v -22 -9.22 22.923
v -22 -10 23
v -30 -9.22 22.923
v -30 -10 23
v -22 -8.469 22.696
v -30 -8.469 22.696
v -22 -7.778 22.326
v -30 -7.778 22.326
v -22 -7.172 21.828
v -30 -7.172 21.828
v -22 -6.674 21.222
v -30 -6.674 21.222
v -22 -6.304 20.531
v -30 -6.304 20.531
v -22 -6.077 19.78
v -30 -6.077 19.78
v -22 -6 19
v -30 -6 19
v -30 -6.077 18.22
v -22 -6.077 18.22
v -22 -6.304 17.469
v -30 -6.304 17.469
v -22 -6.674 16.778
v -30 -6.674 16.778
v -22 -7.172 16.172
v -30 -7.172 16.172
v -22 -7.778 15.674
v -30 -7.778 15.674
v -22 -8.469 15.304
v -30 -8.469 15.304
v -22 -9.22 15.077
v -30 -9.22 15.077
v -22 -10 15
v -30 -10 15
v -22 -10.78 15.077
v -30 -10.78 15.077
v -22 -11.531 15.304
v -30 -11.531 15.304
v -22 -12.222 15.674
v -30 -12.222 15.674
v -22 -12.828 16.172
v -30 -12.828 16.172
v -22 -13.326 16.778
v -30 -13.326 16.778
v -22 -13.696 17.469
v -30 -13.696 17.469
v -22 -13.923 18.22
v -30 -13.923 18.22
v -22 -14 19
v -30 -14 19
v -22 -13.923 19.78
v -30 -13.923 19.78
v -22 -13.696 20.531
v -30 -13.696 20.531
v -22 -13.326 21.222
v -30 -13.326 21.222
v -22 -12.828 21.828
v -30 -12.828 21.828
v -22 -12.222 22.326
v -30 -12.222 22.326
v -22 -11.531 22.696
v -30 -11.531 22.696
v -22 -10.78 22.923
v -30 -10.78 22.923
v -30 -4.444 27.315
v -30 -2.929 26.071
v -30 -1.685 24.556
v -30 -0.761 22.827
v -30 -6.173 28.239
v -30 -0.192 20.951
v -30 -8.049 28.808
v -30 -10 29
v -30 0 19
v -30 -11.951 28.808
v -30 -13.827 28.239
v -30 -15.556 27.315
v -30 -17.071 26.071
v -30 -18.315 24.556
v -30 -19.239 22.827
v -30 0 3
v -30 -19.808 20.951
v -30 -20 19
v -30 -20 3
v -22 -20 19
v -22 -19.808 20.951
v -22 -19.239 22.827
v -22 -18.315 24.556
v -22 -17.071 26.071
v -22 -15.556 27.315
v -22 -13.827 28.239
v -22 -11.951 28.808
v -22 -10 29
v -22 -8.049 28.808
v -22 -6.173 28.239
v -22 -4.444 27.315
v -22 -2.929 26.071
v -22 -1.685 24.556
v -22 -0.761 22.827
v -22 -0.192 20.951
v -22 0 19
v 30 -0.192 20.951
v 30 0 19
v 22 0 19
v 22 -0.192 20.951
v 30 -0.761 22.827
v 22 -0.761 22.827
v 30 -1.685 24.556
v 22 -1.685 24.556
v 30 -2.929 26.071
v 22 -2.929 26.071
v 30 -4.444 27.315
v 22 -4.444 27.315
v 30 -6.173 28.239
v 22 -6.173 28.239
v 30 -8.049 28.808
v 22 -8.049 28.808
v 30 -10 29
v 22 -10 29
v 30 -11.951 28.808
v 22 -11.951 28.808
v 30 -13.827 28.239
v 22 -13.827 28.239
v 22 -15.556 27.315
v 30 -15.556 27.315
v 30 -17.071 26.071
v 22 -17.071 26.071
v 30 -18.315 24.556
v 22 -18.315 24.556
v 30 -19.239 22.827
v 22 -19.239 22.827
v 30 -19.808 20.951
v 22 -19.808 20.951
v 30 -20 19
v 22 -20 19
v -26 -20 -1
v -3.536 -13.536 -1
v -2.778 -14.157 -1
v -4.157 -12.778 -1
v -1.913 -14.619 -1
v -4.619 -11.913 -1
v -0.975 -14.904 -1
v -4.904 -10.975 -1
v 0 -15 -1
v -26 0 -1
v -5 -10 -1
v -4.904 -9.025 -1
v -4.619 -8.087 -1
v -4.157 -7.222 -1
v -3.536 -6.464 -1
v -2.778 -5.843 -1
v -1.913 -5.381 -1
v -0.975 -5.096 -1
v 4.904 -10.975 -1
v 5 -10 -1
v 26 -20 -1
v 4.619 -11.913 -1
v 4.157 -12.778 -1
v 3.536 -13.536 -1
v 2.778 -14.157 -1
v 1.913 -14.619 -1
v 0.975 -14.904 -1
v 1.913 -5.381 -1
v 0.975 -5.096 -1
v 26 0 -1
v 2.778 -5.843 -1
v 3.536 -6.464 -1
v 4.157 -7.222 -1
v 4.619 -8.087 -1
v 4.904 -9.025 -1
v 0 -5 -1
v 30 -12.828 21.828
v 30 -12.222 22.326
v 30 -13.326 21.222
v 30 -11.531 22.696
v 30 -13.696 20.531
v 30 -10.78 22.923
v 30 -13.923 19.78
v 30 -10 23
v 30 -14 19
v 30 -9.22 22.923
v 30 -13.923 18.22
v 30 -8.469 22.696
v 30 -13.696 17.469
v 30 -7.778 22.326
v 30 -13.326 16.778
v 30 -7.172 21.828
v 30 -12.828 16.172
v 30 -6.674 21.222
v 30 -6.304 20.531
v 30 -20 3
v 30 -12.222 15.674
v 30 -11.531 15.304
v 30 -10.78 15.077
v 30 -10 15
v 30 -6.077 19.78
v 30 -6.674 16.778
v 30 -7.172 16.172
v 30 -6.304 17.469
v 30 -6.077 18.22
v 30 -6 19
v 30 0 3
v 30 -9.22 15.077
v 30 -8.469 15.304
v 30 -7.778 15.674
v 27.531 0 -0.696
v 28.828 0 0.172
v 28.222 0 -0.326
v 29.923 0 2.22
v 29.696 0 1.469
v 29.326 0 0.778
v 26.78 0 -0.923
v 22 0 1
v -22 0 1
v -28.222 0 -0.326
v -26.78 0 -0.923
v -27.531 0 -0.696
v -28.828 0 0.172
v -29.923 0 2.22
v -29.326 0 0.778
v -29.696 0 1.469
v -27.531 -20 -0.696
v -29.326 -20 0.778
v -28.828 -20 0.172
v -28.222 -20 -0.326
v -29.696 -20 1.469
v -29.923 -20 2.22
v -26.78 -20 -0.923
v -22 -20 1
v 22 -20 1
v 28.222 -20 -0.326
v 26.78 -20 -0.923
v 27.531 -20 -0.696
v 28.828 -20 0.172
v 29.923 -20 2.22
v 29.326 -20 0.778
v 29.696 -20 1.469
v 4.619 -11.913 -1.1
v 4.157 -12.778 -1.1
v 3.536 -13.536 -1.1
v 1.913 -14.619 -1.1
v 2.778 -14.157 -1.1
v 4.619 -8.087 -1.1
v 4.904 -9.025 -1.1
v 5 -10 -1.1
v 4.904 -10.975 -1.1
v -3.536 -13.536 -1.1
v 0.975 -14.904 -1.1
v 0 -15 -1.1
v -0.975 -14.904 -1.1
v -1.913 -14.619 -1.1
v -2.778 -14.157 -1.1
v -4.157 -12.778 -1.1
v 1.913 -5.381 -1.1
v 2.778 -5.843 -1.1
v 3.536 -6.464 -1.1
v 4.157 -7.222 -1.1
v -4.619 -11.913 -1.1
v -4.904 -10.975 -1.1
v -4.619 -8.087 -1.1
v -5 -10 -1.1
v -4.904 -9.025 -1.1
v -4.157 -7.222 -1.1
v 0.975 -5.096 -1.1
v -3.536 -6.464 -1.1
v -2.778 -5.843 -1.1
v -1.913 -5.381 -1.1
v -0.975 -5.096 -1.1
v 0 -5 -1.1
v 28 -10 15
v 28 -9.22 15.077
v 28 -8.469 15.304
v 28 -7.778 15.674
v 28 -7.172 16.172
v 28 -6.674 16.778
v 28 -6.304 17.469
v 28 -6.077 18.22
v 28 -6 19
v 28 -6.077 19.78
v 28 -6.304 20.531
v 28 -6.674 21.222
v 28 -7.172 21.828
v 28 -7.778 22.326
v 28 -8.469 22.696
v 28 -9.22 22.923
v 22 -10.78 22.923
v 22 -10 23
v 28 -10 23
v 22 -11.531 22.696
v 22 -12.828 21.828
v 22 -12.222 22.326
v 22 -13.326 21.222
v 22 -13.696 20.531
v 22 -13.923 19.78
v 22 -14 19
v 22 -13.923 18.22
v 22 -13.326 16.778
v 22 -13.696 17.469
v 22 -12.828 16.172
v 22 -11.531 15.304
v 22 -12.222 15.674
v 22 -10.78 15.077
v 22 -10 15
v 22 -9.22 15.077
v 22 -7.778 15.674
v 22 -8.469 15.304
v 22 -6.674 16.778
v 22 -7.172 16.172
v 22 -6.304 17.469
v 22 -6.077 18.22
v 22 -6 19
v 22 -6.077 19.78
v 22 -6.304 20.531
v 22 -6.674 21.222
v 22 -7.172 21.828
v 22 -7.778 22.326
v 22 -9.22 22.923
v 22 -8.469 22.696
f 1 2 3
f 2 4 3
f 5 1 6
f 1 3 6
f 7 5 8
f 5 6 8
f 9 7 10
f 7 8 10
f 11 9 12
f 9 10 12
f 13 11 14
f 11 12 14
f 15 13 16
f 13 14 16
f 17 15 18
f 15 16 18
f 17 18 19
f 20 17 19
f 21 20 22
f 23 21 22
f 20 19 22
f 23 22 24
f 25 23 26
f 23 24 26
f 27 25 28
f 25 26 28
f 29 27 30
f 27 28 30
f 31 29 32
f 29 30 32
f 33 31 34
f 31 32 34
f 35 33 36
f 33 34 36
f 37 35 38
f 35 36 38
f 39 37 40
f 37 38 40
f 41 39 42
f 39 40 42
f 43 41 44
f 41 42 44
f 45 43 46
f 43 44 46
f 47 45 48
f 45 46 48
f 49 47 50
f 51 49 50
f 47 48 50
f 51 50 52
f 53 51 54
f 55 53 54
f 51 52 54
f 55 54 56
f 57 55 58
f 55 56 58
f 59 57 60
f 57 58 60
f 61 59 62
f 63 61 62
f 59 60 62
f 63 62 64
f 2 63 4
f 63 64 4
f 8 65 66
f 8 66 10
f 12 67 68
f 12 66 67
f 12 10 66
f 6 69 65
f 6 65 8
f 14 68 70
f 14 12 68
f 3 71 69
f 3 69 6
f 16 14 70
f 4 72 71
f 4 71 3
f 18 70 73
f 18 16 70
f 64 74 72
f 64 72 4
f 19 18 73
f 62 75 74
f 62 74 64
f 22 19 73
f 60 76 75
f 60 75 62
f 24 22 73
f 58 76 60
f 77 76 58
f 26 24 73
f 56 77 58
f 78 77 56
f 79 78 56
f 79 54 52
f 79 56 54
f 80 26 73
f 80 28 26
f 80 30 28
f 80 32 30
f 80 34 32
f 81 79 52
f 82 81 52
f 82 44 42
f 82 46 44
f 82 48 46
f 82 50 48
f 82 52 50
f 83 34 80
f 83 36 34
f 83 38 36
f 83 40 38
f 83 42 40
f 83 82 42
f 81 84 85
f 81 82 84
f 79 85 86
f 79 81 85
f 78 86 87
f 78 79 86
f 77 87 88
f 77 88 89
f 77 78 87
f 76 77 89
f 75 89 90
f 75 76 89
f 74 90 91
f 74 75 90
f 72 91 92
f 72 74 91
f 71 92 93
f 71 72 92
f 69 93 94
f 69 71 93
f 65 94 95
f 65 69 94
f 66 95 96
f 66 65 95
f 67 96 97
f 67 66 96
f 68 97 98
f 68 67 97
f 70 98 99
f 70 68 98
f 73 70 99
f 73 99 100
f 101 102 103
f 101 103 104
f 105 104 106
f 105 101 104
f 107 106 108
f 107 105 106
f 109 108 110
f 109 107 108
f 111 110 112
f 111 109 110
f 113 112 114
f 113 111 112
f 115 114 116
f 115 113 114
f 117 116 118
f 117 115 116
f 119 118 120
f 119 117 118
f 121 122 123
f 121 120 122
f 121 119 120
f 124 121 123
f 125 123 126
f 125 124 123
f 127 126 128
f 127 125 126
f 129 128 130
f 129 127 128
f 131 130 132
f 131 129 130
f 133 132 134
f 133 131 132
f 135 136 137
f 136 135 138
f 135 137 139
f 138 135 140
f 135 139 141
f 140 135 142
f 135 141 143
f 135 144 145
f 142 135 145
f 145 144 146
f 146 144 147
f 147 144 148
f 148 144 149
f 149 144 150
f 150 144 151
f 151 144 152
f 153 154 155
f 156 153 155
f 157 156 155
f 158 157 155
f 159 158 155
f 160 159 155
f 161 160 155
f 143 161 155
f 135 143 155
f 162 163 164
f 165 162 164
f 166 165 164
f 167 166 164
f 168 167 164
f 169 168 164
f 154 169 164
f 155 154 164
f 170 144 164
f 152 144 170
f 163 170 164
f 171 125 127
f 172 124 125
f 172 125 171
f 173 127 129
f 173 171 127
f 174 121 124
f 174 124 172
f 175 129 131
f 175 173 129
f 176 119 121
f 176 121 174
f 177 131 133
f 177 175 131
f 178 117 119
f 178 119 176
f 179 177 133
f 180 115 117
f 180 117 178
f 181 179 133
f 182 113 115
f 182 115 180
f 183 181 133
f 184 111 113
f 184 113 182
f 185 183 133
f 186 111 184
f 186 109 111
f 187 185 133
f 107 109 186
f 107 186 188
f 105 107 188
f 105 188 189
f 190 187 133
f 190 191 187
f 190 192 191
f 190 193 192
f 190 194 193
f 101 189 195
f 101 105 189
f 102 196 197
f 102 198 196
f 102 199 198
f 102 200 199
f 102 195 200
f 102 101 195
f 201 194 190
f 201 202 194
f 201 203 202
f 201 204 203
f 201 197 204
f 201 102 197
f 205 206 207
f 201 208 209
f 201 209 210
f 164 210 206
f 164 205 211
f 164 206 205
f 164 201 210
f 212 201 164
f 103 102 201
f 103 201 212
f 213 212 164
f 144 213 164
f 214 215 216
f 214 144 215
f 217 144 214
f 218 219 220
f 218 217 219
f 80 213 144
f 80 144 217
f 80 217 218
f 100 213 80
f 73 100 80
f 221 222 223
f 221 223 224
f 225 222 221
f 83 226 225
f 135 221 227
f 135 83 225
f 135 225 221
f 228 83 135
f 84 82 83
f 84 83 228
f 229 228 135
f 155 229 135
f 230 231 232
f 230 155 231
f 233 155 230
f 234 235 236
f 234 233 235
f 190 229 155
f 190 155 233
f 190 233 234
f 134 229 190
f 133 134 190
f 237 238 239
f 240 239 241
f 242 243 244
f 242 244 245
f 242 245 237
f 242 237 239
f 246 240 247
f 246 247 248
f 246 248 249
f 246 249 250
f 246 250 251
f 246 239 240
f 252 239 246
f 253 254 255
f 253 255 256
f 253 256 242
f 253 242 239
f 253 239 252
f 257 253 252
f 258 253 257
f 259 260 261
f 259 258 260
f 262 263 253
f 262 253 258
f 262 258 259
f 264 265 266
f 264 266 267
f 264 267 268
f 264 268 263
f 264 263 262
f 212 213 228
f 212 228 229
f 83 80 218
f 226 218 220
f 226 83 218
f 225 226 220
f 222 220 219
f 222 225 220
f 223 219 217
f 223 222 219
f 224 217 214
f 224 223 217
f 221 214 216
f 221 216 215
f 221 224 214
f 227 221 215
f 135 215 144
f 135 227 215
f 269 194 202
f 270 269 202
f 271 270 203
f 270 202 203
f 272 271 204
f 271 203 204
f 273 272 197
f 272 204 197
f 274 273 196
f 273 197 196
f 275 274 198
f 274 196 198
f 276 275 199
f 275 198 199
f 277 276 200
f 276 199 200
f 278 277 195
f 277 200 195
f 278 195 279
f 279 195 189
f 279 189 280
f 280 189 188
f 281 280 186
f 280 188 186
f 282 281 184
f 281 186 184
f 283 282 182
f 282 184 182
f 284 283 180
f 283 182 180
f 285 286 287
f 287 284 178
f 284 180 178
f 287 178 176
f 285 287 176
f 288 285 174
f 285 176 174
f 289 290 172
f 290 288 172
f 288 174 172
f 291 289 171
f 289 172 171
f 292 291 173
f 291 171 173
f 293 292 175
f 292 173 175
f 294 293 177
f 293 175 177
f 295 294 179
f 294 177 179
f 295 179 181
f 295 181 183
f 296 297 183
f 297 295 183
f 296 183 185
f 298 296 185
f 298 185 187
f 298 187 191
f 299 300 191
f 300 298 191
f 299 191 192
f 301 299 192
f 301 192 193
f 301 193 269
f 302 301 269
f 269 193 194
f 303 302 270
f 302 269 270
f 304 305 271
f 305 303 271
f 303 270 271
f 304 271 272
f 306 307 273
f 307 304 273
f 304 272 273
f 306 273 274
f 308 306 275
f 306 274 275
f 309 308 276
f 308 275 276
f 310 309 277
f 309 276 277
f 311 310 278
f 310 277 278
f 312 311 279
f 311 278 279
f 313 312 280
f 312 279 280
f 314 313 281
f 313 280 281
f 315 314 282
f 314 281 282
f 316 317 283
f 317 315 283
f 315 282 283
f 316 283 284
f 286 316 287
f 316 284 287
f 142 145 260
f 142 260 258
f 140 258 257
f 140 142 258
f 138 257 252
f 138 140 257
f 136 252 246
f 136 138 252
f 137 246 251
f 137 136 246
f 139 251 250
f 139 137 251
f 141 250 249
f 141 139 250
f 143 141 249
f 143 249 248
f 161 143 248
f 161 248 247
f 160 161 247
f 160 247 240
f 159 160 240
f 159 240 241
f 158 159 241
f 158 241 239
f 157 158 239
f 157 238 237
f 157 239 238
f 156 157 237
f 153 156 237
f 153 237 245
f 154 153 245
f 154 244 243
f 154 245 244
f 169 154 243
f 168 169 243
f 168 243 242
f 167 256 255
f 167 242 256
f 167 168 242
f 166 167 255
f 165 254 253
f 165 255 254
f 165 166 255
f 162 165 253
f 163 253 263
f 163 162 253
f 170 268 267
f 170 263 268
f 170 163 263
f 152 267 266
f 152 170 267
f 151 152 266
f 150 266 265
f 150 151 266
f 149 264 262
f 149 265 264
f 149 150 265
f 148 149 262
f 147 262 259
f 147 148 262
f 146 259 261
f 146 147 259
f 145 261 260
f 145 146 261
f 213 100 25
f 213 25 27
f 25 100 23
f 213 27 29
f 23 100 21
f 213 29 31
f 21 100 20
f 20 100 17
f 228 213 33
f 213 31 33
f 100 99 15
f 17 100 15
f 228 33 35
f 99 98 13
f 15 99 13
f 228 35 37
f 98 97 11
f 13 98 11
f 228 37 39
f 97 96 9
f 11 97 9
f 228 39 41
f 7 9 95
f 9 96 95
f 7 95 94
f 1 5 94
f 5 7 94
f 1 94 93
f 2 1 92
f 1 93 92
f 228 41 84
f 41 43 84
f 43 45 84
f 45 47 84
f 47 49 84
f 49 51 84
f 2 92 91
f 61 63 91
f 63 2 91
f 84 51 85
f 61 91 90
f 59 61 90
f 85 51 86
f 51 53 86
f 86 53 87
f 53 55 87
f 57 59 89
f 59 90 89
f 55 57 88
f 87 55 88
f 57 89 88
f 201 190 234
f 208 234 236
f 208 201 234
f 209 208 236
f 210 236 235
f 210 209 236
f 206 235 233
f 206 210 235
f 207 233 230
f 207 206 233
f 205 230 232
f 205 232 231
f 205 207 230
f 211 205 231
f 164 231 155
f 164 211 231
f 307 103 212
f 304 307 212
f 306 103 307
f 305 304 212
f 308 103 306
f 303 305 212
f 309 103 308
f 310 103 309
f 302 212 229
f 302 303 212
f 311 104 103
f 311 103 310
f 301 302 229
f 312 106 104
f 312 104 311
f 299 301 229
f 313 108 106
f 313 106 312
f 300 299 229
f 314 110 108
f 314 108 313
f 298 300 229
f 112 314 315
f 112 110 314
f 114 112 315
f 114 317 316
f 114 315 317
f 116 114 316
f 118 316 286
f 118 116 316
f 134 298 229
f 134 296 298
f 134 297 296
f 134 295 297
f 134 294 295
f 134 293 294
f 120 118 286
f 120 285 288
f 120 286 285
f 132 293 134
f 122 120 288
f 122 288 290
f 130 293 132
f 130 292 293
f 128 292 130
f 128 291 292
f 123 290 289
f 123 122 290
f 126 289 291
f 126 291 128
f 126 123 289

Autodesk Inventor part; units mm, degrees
ref_plane "YZ Plane" through (0, 0, 0) normal (1, 0, 0) x (0, 1, 0)
ref_plane "XZ Plane" through (0, 0, 0) normal (0, 1, 0) x (-1, 0, 0)
ref_plane "XY Plane" through (0, 0, 0) normal (0, 0, 1) x (1, 0, 0)
sketch "Sketch1" plane through (0, 0, 0) normal (0, 0, 1) x (1, 0, 0)
  line L0 (0, 0) -> (30, 0)
  line L1 (30, -20) -> (0, -20)
  line L2 (0, 0) -> (0, -20)
  line L3 (0, 0) -> (-30, 0)
  line L4 (-30, -20) -> (0, -20)
  line L5 (30, 0) -> (30, -20)
  line L6 (-30, 0) -> (-30, -20)
  dimension "d0" = 30
  dimension "d6" = 20
extrude "Extrusion1" add sketch "Sketch1" along normal mid plane 2
sketch "Sketch2" plane through (-28, -20, -1) normal (-1, 0, 0) x (0, -1, 0)
  line L0 (-20, 0) -> (0, 0)
  line L1 (0, 0) -> (0, 30)
  line L2 (0, 30) -> (-20, 30)
  line L3 (-20, 30) -> (-20, 0)
edge flange "Flange1" height 30 angle 90 thickness 2 bend radius 2 thickness toward (-1, 0, 0) relief tear relief width 2 relief depth 1 edges at (-30, -10, 1) wall of the first edge with corners at (-28, 0, -1) (-28, -20, -1) (-28, -20, 29) (-28, 0, 29)
bend "Bend1"
corner "Corner1"
sketch "Sketch3" plane through (28, 0, -1) normal (1, 0, 0) x (0, 1, 0)
  line L0 (-20, 0) -> (0, 0)
  line L1 (0, 0) -> (0, 30)
  line L2 (0, 30) -> (-20, 30)
  line L3 (-20, 30) -> (-20, 0)
edge flange "Flange2" height 30 angle 90 thickness 2 bend radius 2 thickness toward (1, 0, 0) relief tear relief width 2 relief depth 1 edges at (30, -10, 1) wall of the first edge with corners at (28, -20, -1) (28, 0, -1) (28, 0, 29) (28, -20, 29)
bend "Bend2"
corner "Corner2"
sketch "Sketch5" plane through (30, -20, 29) normal (1, 0, 0) x (0, 0, -1)
  line L0 (26, 0) -> (0, 0) projected
  line L1 (0, 0) -> (0, 20) projected
  line L2 (0, 20) -> (0, 0) projected
  line L3 (0, 0) -> (0, 20)
  line L4 (0, 20) -> (10, 20)
  line L5 (0, 0) -> (10, 0)
  line L6 (0, 0) -> (26, 0) projected
  arc A0 (10, 20) -> (10, 0) centre (10, 10) ccw
  line L7 (0, 20) -> (26, 20) projected
  circle A1 centre (10, 10) radius 4
  point P0 (29, 20)
  point P1 (0, 10)
  dimension "d38" = 10
  dimension "d39" = 10
  dimension "d40" = 10
  dimension "d46" = 8
extrude "Cut1" cut sketch "Sketch5" against normal blind 2
sketch "Sketch6" plane through (-30, -20, 29) normal (-1, 0, 0) x (0, 0, 1)
  line L0 (0, 20) -> (0, 0) projected
  line L1 (-10, 0) -> (0, 0)
  line L2 (0, 0) -> (0, 20)
  line L3 (0, 20) -> (-10, 20)
  line L4 (-26, 20) -> (0, 20) projected
  arc A0 (-10, 0) -> (-10, 20) centre (-10, 10) ccw
  circle A1 centre (-10, 10) radius 4
  point P0 (-29, 20)
  point P1 (0, 10)
  dimension "d43" = 10
  dimension "d47" = 8
extrude "Cut2" cut sketch "Sketch6" against normal blind 2
sketch "Sketch8" plane through (-30, -20, 3) normal (-1, 0, 0) x (0, 0, 1)
  line L0 (16, 0) -> (0, 0) projected
  arc A0 (16, 0) -> (16, 20) centre (16, 10) ccw projected
  line L1 (0, 20) -> (16, 20) projected
  line L2 (0, 20) -> (0, 0) projected
  line L3 (16, 0) -> (0, 0) projected
  arc A1 (16, 0) -> (16, 20) centre (16, 10) ccw projected
  line L4 (0, 0) -> (16, 0)
  arc A2 (16, 0) -> (16, 20) centre (16, 10) ccw
  line L5 (16, 20) -> (0, 20) projected
  line L6 (16, 20) -> (0, 20)
  line L7 (0, 20) -> (0, 0) projected
  line L8 (0, 20) -> (0, 0)
  circle A3 centre (16, 10) radius 4
  point P0 (-3, 20)
extrude "Extrusion3" add sketch "Sketch8" against normal blind 8
sketch "Sketch9" plane through (28, -20, 3) normal (-1, 0, 0) x (0, 0, 1)
  line L0 (0, 0) -> (16, 0) projected
  line L1 (0, 0) -> (16, 0)
  line L2 (16, 0) -> (0, 0) projected
  arc A0 (16, 0) -> (16, 20) centre (16, 10) ccw
  arc A1 (16, 0) -> (16, 20) centre (16, 10) ccw projected
  line L3 (0, 0) -> (0, 20) projected
  line L4 (16, 20) -> (0, 20)
  line L5 (0, 20) -> (0, 0)
  circle A2 centre (16, 10) radius 4 projected
  circle A3 centre (16, 10) radius 4
  point P0 (-3, 20)
extrude "Extrusion4" add sketch "Sketch9" along normal blind 6
sketch "Sketch11" plane through (-22, 0, 3) normal (0, 0, -1) x (-1, 0, 0)
  line L0 (6, 0) -> (0, 0) projected
  line L1 (0, 0) -> (6, 0)
  line L2 (6, -20) -> (6, 0) projected
  line L3 (6, 0) -> (6, -20)
  line L4 (6, -20) -> (0, -20) projected
  line L5 (6, -20) -> (0, -20)
  line L6 (0, 0) -> (0, -20) projected
  line L7 (0, -20) -> (0, 0)
  point P0 (-22, 0)
extrude "Extrusion5" add sketch "Sketch11" along normal blind 3
sketch "Sketch12" plane through (28, -20, 3) normal (0, 0, -1) x (-1, 0, 0)
  line L0 (2, 20) -> (0, 20) projected
  line L1 (6, 20) -> (6, 0) projected
  line L2 (0, 20) -> (6, 20)
  line L3 (6, 20) -> (6, 0)
  line L4 (2, 0) -> (0, 0) projected
  line L5 (6, 0) -> (0, 0)
  line L6 (0, 20) -> (0, 0) projected
  line L7 (0, 0) -> (0, 20)
  point P0 (28, 20)
extrude "Extrusion6" add sketch "Sketch12" along normal blind 3
sketch "Sketch13" plane through (0, 0, -1) normal (0, 0, -1) x (-1, 0, 0)
  circle A0 centre (0, -10) radius 5
  line L0 (26, -20) -> (26, 0) projected
  point P0 (0, 0)
  dimension "d62" = 10
  dimension "d63" = 10
  dimension "d64" = 26
extrude "Extrusion7" add sketch "Sketch13" along normal blind 0.1
equation "\"d41\" = Thickness"
equation "\"d44\" = Thickness"
equation "\"d7\" = Thickness"
equation "\"d8\" = BendReliefWidth"
equation "\"d9\" = BendReliefDepth"
equation "\"d10\" = MinimumRemnant"
equation "\"d11\" = TransitionRadius"
equation "\"d14\" = BendRadius"
equation "\"d15\" = CornerReliefSize"
equation "\"d16\" = GapSize"
equation "\"d17\" = JacobiRadiusSize"
equation "\"d18\" = BendReliefWidth"
equation "\"d19\" = BendReliefDepth"
equation "\"d20\" = MinimumRemnant"
equation "\"d21\" = TransitionRadius"
equation "\"d24\" = BendRadius"
equation "\"d25\" = CornerReliefSize"
equation "\"d26\" = GapSize"
equation "\"d27\" = JacobiRadiusSize"
equation "\"BendRadius\" = Thickness"
equation "\"BendReliefWidth\" = Thickness"
equation "\"BendReliefDepth\" = 0.5 * Thickness"
equation "\"CornerReliefSize\" = 4 * Thickness"
equation "\"MinimumRemnant\" = 2 * Thickness"
equation "\"TransitionRadius\" = BendRadius"
equation "\"JacobiRadiusSize\" = BendRadius"
equation "\"GapSize\" = Thickness"
equation "\"Thickness\" = 2"
properties part number "SHEET_METAL1"
